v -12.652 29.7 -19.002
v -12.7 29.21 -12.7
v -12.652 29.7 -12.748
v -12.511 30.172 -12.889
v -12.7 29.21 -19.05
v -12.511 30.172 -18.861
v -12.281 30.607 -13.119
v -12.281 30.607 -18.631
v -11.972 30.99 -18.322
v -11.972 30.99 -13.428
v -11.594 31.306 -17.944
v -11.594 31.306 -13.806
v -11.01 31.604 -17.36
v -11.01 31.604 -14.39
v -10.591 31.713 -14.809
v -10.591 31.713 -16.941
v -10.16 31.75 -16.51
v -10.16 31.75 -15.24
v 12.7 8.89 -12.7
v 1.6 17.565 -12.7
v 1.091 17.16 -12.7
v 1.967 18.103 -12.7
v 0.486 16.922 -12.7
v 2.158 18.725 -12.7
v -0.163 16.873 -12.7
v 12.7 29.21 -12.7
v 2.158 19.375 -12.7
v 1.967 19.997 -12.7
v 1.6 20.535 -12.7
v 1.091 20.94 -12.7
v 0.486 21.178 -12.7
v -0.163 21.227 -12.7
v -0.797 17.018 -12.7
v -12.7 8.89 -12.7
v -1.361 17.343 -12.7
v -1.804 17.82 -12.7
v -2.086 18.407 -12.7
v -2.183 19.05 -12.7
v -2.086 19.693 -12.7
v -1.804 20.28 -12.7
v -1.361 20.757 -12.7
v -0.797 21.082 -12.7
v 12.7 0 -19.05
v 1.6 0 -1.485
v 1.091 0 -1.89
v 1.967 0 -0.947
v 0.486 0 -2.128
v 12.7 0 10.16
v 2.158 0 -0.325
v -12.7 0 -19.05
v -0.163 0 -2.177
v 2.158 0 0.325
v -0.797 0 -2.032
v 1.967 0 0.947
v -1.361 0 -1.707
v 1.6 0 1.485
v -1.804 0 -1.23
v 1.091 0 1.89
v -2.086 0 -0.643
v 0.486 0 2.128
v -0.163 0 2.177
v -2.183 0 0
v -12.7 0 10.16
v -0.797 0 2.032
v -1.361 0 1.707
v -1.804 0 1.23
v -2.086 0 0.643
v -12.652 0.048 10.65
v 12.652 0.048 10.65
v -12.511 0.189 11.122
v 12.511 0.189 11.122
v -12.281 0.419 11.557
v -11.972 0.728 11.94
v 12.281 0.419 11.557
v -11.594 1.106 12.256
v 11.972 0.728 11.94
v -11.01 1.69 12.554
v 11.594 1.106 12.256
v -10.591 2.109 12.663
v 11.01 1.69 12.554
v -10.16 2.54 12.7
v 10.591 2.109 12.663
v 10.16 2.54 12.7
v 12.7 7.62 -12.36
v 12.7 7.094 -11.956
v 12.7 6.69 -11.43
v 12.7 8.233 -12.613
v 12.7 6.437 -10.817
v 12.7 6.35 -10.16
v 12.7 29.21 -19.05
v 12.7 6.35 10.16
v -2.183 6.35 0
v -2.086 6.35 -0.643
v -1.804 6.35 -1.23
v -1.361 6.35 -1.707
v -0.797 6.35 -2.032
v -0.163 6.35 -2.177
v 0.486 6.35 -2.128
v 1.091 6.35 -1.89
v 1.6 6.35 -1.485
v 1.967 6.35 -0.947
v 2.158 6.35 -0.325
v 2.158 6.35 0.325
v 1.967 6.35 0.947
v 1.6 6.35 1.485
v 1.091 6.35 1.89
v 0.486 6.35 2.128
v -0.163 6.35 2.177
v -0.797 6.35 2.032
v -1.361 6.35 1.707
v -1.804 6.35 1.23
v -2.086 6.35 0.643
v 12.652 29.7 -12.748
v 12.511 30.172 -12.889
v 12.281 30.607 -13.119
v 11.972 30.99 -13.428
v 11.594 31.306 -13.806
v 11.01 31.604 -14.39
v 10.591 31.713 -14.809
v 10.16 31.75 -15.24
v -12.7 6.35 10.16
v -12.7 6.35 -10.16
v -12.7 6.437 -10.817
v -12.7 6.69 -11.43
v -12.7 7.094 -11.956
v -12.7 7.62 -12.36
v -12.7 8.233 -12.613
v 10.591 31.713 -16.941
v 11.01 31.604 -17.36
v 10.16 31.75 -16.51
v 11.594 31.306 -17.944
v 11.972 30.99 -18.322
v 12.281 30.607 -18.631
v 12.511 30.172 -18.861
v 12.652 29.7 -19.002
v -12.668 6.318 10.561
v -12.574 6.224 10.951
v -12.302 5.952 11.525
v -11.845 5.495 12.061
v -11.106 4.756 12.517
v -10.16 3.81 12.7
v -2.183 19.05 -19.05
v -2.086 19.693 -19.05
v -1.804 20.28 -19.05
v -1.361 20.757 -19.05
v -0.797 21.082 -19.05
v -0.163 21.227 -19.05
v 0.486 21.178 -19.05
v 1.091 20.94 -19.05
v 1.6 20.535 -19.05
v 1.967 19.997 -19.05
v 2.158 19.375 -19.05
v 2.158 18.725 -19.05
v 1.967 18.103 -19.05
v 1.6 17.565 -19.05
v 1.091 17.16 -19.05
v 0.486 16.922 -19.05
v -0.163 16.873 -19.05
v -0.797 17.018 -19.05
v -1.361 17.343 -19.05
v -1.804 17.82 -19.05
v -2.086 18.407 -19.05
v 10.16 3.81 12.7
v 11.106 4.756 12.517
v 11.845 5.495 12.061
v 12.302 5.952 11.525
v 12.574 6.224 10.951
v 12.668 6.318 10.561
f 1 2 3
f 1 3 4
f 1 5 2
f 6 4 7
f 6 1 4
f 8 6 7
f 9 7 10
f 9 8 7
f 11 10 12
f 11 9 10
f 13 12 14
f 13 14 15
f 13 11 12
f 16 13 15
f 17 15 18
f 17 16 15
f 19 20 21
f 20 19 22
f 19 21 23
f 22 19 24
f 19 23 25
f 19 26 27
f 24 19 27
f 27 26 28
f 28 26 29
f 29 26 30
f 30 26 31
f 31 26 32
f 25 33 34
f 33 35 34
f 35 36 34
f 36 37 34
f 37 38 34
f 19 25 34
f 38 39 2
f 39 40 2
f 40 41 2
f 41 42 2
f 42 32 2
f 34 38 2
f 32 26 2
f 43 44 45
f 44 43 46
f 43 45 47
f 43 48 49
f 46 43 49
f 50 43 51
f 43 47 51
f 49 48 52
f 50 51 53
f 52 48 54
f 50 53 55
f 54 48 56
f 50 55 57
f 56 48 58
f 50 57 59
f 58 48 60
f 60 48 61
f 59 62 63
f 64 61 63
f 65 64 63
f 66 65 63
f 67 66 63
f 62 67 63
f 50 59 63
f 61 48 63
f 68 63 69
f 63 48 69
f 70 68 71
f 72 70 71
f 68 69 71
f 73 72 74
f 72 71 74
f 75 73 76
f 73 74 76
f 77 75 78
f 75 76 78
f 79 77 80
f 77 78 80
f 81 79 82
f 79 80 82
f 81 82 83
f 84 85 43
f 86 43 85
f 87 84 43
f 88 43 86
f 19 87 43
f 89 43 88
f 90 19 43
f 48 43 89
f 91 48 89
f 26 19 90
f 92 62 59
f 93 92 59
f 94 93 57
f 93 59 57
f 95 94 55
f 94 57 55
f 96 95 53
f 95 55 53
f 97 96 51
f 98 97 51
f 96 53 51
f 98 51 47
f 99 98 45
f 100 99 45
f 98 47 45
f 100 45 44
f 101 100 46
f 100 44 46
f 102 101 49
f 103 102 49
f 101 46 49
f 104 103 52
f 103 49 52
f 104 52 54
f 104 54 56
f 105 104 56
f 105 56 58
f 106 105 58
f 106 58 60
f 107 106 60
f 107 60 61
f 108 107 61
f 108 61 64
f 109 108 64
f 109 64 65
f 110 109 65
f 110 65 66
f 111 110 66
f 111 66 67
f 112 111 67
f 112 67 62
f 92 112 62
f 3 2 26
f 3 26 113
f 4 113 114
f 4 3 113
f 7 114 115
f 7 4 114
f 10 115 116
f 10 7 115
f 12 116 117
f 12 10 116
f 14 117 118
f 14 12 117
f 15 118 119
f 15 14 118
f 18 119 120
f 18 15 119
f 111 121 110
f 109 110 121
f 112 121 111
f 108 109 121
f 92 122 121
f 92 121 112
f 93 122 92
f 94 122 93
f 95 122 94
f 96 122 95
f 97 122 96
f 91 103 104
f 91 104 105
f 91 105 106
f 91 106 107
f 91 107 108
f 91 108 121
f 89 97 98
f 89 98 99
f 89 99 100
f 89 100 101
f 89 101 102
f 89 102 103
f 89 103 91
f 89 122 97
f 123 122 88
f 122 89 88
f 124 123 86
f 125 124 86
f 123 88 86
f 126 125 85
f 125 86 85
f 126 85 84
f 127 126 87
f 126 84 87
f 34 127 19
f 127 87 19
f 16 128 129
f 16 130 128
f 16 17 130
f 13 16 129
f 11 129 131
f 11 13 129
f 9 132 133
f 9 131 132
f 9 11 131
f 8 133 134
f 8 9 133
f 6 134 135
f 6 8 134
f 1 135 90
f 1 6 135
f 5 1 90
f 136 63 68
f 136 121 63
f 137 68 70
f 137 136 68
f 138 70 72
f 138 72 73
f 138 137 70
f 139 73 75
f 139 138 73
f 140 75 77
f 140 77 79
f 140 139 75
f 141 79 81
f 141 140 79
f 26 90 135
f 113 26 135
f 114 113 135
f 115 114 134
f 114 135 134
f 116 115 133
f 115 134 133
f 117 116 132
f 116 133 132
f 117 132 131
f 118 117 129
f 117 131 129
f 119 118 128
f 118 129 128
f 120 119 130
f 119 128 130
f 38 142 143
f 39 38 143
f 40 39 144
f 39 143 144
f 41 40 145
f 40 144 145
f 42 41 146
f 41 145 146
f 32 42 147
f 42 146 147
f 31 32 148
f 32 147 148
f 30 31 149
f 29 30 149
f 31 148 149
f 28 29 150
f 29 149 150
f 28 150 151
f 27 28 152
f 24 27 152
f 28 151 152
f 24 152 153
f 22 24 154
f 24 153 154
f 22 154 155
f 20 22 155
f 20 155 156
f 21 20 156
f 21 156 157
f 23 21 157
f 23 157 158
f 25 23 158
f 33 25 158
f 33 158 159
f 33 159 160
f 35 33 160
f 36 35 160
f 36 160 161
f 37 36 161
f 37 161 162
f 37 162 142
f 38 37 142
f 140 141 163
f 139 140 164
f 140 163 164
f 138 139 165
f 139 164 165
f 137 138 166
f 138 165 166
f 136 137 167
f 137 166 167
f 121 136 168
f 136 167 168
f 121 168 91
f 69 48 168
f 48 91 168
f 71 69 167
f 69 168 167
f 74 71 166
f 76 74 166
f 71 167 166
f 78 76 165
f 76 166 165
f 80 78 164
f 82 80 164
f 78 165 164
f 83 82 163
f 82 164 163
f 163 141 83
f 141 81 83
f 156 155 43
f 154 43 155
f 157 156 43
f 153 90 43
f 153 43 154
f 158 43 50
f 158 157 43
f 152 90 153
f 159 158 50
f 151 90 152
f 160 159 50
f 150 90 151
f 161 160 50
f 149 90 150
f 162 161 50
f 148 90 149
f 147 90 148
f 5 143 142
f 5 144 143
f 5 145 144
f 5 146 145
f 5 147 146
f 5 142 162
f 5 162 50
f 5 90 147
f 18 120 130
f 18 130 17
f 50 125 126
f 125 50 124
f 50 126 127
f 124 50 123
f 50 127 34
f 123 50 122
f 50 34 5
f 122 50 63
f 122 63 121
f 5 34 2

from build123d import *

# Parameters (mm, degrees)
SKETCH1_W                        = 25.4
SKETCH1_H                        = 25.4
BOSS_EXTRUDE1_DEPTH              = 6.35
SKETCH2_W                        = 25.4
SKETCH2_H                        = 31.75
BOSS_EXTRUDE2_DEPTH              = 6.35
FILLET1_R                        = 2.54
F_11_64_0_17188_DIAMETER_HOLE1_D = 4.365752
F_11_64_0_17188_DIAMETER_HOLE2_D = 4.365752


with BuildPart() as part:
    # Sketch1 → Boss-Extrude1 (new body)
    with BuildSketch(Plane(origin=(0, 0, 0), x_dir=(1, 0, 0), z_dir=(0, 1, 0))):
        Rectangle(SKETCH1_W, SKETCH1_H)
    extrude(amount=BOSS_EXTRUDE1_DEPTH)

    # Sketch2 → Boss-Extrude2 (add)
    with BuildSketch(Plane(origin=(0, 0, -12.7), x_dir=(-1, 0, 0), z_dir=(0, 0, -1))):
        with Locations((0, 15.875)):
            Rectangle(SKETCH2_W, SKETCH2_H)
    extrude(amount=BOSS_EXTRUDE2_DEPTH)

    # Fillet1
    fillet1_edges = [part.edges().sort_by_distance(p)[0] for p in [
        (0, 31.75, -12.7),
        (-12.7, 31.75, -15.875),
        (12.7, 31.75, -15.875),
        (0, 6.35, 12.7),
        (0, 31.75, -19.05),
        (0, 0, 12.7),
        (12.7, 3.175, 12.7),
        (-12.7, 3.175, 12.7),
        (0, 6.35, -12.7),
    ]]
    fillet(fillet1_edges, radius=FILLET1_R)

    # 11/64 (0.17188) Diameter Hole1 (through all)
    with Locations(Plane(origin=(0, 6.35, 0), x_dir=(1, 0, 0), z_dir=(0, 1, 0))):
        with Locations((0, 0)):
            Hole(F_11_64_0_17188_DIAMETER_HOLE1_D / 2)

    # 11/64 (0.17188) Diameter Hole2 (through all)
    with Locations(Plane.XY.offset(-12.7)):
        with Locations((0, 19.05)):
            Hole(F_11_64_0_17188_DIAMETER_HOLE2_D / 2)


solid = part.part
